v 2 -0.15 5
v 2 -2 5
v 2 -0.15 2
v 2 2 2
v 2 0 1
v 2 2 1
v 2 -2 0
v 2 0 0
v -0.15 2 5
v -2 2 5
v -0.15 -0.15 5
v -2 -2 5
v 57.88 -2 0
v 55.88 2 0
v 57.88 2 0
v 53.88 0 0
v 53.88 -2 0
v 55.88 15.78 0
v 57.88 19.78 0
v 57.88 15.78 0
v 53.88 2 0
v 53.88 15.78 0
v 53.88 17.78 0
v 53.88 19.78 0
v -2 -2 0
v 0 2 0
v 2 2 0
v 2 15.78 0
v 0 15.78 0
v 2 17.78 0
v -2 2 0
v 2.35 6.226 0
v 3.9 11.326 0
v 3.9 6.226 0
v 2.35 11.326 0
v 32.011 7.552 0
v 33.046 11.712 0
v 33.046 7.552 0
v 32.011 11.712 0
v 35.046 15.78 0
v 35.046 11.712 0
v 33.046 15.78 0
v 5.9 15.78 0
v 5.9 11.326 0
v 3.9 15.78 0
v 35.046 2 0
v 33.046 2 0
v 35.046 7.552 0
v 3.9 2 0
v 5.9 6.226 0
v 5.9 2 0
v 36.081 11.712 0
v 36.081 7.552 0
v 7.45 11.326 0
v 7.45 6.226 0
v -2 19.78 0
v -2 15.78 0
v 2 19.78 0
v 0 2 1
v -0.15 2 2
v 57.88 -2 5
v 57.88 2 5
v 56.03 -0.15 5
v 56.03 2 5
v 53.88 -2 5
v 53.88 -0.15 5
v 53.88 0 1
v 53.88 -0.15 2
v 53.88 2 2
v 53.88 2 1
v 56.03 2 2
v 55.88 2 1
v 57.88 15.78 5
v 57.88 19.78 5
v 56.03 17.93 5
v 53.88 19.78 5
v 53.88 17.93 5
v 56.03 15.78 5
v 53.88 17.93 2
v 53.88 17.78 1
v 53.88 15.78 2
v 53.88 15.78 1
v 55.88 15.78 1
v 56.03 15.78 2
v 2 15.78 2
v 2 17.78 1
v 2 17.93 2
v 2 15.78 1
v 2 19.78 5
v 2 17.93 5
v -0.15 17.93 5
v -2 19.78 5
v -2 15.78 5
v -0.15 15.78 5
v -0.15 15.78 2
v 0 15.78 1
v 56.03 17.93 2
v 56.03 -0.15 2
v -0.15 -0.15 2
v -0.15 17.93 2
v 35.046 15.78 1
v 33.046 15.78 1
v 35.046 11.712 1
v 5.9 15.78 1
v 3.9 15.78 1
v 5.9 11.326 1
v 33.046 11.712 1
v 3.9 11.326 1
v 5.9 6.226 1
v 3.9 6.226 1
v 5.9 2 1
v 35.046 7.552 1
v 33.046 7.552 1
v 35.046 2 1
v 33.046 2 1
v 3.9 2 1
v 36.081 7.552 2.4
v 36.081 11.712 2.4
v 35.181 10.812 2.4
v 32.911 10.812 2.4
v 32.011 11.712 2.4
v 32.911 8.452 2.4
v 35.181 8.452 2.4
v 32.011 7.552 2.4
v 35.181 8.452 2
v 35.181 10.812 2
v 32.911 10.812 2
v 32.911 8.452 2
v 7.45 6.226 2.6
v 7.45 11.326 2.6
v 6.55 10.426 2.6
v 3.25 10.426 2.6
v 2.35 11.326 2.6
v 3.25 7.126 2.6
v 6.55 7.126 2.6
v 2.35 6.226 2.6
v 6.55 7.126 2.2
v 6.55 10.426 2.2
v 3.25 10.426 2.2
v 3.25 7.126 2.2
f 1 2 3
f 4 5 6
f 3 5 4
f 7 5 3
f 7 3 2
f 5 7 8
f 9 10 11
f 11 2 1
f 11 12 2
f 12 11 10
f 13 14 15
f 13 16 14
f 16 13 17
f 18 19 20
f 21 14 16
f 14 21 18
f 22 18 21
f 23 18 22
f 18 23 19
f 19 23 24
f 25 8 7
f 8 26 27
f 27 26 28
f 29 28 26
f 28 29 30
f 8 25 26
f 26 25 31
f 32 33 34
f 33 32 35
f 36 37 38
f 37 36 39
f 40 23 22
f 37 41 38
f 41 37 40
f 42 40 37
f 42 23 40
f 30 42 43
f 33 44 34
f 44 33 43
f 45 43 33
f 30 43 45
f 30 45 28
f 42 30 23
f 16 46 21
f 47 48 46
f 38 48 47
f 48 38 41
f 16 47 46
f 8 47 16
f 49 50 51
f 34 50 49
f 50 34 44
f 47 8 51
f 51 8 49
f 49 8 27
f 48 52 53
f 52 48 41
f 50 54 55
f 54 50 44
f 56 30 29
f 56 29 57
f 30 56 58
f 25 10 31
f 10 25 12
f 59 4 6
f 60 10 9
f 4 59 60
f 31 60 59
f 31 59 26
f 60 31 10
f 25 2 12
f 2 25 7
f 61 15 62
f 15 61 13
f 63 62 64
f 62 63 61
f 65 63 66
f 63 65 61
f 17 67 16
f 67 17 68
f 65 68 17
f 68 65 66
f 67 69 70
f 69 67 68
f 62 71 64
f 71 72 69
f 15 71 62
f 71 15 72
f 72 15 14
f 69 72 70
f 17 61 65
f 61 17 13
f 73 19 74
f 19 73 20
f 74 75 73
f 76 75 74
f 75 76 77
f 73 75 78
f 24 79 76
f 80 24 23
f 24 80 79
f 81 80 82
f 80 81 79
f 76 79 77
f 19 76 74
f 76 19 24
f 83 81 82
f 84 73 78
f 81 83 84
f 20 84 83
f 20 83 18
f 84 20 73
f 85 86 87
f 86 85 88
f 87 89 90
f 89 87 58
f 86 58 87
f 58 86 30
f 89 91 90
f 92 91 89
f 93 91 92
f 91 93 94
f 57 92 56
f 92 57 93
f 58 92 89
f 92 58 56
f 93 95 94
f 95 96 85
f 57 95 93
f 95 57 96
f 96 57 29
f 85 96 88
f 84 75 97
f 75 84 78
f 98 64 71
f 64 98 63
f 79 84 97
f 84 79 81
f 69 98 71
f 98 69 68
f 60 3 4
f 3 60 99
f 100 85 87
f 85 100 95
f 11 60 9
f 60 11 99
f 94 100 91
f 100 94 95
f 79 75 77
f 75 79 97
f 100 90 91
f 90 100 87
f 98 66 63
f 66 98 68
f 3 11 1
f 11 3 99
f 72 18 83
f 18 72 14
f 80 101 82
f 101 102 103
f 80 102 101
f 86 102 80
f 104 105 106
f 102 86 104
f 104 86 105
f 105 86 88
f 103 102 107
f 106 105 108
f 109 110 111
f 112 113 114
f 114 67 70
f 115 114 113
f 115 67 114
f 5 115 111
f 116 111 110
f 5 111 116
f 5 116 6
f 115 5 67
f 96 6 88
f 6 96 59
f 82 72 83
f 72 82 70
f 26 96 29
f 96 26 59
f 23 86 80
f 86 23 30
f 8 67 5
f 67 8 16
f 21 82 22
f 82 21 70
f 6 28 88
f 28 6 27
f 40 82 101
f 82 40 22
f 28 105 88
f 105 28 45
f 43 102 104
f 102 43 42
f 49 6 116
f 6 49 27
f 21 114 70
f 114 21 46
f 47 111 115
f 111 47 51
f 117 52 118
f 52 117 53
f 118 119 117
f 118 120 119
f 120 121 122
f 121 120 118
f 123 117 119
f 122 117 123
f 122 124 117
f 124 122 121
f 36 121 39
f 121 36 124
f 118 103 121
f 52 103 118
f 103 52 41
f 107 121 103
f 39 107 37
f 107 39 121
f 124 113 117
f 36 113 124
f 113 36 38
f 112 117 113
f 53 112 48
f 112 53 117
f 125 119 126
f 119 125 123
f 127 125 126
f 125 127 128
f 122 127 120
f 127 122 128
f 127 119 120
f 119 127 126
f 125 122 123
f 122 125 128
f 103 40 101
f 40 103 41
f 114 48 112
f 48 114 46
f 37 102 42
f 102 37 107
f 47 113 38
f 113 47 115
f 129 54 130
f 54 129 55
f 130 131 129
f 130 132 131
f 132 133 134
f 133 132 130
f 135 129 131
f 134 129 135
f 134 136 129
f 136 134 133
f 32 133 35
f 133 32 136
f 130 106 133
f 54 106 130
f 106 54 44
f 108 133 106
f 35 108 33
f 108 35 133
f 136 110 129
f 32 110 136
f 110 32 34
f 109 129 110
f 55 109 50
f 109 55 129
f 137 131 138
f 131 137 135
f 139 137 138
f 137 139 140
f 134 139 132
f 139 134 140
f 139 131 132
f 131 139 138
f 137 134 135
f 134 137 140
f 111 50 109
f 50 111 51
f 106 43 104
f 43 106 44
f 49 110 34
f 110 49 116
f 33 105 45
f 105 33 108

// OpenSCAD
C = 25.4;
PIN = C / 10.0;

DX = 2.2 * C;
DY = 0.7 * C;
PINY = 0.6 * C;

PILLAR = 4.0;
PILLAR_Z = 5.0;
BASE = 2.0;
TARGET = 3.0;
EDGE = 0.4;
TRIM = 0.1;

EPS = 0.001;
STRUCTURE = 2.0;
ZSTRUCT = 1.0;

module pillar() {
    translate([-PILLAR/2, -PILLAR/2, 0])
        cube(size=[PILLAR, PILLAR, PILLAR_Z]);
}

module support(x, y, sx, sy, height) {
    x = x + 0.05*C;
    y = 0.05*C + PINY - y;

    T = 1.0;
    difference() {
        translate([x - sx/2 - T, y - sy/2 - T, 0]) 
            cube(size=[sx + 2*T, sy + 2*T, TARGET - height + EDGE]);
        translate([x - sx/2 - TRIM, y - sy/2 - TRIM, TARGET - height])
            cube(size=[sx + TRIM*2, sy + TRIM*2, 10.0]);
    }
    translate([x - STRUCTURE/2, 0, 0])
        cube(size=[STRUCTURE, DY, ZSTRUCT]);
}

difference() {
    union() {
        pillar();
        translate([DX, 0, 0]) pillar();
        translate([DX, DY, 0]) pillar();
        translate([0, DY, 0]) pillar();
    }
    T = 0.15;
    translate([-T, -T, BASE])
        cube(size=[DX + T*2, DY + T*2, 10]);
}

// Base
difference() {
    cube(size=[DX, DY, ZSTRUCT]);
    translate([STRUCTURE, STRUCTURE, -EPS]) 
        cube(size=[DX-STRUCTURE*2, DY-STRUCTURE*2, 100]);
}

// accel
support(1.2904*C, 0.2708*C, 2.06 + 0.01, 2.06 + 0.1, 1.0);
// amp
support(0.1429*C, 0.3045*C, 3.10, 3.10, 0.8);

/*
// mosfet
support(1.8256*C, 0.4913*C, 1.7, 2.0, 0.7);
support(1.8288*C, 0.3369*C, 1.7, 2.0, 0.7);
support(1.8288*C, 0.2244*C, 1.7, 2.0, 0.7);
*/
